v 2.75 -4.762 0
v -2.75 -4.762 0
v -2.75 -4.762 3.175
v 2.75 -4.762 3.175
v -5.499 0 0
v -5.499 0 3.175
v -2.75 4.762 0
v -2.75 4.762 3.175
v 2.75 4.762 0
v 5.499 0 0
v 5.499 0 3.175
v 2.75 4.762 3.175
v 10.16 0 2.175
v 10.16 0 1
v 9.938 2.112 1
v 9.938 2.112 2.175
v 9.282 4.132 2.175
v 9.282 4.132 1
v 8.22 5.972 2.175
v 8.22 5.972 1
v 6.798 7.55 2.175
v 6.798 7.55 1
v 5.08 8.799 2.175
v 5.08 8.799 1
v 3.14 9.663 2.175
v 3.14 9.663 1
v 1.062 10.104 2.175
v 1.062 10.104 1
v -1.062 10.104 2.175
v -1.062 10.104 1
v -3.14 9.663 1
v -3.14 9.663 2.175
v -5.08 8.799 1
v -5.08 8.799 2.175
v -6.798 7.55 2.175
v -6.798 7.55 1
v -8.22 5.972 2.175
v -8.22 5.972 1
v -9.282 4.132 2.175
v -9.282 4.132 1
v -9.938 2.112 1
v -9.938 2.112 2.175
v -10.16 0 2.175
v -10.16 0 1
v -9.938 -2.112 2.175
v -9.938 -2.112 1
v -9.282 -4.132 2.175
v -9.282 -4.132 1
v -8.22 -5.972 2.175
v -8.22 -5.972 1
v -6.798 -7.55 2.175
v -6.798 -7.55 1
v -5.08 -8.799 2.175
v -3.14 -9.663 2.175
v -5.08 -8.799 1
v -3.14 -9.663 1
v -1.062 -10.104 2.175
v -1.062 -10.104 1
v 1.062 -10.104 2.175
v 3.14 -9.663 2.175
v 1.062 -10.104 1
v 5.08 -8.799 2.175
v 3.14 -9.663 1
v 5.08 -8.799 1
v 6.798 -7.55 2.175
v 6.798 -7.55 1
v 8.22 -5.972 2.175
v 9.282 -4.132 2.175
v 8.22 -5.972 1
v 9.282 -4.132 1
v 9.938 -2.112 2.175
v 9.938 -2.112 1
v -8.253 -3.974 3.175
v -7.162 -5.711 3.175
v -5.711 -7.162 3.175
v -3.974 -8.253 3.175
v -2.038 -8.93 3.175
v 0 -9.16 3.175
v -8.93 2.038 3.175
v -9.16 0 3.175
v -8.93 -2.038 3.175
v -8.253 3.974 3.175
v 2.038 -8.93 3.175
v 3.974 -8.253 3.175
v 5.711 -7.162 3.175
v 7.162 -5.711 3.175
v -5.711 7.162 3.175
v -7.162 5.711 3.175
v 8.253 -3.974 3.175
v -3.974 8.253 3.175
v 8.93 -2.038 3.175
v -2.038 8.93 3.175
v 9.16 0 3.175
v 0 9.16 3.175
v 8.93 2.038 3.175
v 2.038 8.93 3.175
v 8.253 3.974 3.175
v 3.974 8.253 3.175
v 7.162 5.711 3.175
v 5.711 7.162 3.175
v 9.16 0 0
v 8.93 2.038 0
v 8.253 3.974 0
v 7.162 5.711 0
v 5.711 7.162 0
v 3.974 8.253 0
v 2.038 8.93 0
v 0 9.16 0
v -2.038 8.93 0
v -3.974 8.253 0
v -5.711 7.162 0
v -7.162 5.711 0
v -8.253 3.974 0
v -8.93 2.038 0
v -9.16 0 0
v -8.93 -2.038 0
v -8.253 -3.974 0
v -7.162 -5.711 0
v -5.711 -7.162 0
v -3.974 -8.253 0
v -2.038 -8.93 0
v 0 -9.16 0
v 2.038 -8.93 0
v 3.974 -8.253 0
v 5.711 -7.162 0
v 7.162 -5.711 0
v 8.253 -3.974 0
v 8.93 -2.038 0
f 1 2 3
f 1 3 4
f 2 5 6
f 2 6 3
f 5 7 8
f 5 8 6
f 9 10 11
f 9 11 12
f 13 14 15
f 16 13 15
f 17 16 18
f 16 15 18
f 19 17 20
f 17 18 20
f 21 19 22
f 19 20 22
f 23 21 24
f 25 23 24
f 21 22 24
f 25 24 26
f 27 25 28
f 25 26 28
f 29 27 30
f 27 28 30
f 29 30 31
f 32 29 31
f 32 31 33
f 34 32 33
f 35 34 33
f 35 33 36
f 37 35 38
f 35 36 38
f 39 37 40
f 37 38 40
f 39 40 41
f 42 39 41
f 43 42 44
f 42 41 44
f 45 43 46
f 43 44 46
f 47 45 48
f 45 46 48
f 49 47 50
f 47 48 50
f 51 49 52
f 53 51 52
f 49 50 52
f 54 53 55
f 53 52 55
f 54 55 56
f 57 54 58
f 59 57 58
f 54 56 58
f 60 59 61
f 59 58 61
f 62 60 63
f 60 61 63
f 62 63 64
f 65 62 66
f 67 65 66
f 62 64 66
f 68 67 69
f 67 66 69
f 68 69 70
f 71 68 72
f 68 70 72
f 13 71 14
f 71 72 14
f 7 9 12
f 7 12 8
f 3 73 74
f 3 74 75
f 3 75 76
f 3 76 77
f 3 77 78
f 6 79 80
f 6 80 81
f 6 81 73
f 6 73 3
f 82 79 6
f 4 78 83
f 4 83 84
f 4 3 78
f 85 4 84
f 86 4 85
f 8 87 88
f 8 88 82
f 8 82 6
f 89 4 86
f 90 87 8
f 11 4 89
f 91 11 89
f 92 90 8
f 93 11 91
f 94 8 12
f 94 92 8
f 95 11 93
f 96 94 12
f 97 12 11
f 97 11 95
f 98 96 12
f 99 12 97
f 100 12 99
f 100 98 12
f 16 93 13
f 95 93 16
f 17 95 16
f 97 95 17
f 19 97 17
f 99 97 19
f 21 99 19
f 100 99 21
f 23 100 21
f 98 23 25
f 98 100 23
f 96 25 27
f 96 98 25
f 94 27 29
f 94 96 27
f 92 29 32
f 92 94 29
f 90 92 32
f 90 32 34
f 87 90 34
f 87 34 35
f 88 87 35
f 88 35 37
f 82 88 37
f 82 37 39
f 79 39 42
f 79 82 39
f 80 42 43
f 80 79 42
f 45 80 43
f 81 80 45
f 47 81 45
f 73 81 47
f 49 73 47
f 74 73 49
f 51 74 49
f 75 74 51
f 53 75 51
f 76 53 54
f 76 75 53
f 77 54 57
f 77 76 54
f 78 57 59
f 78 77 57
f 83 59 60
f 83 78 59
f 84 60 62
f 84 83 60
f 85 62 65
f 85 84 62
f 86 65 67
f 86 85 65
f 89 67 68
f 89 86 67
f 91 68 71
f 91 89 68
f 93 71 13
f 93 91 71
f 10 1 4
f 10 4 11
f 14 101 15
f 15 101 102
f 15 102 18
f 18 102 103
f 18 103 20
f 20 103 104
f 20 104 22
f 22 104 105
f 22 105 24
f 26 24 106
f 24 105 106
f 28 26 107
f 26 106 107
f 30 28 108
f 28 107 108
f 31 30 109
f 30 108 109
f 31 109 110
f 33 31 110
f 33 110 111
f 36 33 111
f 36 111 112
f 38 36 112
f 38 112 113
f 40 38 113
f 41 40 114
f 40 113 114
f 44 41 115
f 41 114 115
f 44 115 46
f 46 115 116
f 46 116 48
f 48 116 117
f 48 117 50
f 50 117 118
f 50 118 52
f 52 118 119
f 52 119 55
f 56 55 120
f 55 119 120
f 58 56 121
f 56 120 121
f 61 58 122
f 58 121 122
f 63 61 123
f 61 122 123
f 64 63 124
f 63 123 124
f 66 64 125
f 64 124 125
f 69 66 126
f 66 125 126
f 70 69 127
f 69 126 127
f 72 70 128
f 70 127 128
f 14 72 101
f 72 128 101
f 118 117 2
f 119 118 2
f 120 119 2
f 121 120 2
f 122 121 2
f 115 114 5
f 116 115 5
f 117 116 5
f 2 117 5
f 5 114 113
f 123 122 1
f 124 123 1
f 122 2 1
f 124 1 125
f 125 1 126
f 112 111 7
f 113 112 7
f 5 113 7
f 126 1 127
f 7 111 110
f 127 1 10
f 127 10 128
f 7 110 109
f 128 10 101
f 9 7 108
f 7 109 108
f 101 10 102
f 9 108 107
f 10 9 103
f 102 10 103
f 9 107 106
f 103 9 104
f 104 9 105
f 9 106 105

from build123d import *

# Parameters (mm, degrees)
SKETCH1_R           = 10.16
BOSS_EXTRUDE1_DEPTH = 3.175
CHAMFER1_SIZE       = 1


with BuildPart() as part:
    # Sketch1 → Boss-Extrude1 (new body)
    with BuildSketch(Plane.XY):
        Circle(SKETCH1_R)
        Polygon((5.499261314, 0), (2.749630657, 4.7625), (-2.749630657, 4.7625), (-5.499261314, 0), (-2.749630657, -4.7625), (2.749630657, -4.7625), align=None, mode=Mode.SUBTRACT)
    extrude(amount=BOSS_EXTRUDE1_DEPTH)

    # Chamfer1
    chamfer1_edges = [part.edges().sort_by_distance(p)[0] for p in [
        (-10.16, 0, 0),
        (-10.16, 0, 3.175),
    ]]
    chamfer(chamfer1_edges, length=CHAMFER1_SIZE)


solid = part.part
